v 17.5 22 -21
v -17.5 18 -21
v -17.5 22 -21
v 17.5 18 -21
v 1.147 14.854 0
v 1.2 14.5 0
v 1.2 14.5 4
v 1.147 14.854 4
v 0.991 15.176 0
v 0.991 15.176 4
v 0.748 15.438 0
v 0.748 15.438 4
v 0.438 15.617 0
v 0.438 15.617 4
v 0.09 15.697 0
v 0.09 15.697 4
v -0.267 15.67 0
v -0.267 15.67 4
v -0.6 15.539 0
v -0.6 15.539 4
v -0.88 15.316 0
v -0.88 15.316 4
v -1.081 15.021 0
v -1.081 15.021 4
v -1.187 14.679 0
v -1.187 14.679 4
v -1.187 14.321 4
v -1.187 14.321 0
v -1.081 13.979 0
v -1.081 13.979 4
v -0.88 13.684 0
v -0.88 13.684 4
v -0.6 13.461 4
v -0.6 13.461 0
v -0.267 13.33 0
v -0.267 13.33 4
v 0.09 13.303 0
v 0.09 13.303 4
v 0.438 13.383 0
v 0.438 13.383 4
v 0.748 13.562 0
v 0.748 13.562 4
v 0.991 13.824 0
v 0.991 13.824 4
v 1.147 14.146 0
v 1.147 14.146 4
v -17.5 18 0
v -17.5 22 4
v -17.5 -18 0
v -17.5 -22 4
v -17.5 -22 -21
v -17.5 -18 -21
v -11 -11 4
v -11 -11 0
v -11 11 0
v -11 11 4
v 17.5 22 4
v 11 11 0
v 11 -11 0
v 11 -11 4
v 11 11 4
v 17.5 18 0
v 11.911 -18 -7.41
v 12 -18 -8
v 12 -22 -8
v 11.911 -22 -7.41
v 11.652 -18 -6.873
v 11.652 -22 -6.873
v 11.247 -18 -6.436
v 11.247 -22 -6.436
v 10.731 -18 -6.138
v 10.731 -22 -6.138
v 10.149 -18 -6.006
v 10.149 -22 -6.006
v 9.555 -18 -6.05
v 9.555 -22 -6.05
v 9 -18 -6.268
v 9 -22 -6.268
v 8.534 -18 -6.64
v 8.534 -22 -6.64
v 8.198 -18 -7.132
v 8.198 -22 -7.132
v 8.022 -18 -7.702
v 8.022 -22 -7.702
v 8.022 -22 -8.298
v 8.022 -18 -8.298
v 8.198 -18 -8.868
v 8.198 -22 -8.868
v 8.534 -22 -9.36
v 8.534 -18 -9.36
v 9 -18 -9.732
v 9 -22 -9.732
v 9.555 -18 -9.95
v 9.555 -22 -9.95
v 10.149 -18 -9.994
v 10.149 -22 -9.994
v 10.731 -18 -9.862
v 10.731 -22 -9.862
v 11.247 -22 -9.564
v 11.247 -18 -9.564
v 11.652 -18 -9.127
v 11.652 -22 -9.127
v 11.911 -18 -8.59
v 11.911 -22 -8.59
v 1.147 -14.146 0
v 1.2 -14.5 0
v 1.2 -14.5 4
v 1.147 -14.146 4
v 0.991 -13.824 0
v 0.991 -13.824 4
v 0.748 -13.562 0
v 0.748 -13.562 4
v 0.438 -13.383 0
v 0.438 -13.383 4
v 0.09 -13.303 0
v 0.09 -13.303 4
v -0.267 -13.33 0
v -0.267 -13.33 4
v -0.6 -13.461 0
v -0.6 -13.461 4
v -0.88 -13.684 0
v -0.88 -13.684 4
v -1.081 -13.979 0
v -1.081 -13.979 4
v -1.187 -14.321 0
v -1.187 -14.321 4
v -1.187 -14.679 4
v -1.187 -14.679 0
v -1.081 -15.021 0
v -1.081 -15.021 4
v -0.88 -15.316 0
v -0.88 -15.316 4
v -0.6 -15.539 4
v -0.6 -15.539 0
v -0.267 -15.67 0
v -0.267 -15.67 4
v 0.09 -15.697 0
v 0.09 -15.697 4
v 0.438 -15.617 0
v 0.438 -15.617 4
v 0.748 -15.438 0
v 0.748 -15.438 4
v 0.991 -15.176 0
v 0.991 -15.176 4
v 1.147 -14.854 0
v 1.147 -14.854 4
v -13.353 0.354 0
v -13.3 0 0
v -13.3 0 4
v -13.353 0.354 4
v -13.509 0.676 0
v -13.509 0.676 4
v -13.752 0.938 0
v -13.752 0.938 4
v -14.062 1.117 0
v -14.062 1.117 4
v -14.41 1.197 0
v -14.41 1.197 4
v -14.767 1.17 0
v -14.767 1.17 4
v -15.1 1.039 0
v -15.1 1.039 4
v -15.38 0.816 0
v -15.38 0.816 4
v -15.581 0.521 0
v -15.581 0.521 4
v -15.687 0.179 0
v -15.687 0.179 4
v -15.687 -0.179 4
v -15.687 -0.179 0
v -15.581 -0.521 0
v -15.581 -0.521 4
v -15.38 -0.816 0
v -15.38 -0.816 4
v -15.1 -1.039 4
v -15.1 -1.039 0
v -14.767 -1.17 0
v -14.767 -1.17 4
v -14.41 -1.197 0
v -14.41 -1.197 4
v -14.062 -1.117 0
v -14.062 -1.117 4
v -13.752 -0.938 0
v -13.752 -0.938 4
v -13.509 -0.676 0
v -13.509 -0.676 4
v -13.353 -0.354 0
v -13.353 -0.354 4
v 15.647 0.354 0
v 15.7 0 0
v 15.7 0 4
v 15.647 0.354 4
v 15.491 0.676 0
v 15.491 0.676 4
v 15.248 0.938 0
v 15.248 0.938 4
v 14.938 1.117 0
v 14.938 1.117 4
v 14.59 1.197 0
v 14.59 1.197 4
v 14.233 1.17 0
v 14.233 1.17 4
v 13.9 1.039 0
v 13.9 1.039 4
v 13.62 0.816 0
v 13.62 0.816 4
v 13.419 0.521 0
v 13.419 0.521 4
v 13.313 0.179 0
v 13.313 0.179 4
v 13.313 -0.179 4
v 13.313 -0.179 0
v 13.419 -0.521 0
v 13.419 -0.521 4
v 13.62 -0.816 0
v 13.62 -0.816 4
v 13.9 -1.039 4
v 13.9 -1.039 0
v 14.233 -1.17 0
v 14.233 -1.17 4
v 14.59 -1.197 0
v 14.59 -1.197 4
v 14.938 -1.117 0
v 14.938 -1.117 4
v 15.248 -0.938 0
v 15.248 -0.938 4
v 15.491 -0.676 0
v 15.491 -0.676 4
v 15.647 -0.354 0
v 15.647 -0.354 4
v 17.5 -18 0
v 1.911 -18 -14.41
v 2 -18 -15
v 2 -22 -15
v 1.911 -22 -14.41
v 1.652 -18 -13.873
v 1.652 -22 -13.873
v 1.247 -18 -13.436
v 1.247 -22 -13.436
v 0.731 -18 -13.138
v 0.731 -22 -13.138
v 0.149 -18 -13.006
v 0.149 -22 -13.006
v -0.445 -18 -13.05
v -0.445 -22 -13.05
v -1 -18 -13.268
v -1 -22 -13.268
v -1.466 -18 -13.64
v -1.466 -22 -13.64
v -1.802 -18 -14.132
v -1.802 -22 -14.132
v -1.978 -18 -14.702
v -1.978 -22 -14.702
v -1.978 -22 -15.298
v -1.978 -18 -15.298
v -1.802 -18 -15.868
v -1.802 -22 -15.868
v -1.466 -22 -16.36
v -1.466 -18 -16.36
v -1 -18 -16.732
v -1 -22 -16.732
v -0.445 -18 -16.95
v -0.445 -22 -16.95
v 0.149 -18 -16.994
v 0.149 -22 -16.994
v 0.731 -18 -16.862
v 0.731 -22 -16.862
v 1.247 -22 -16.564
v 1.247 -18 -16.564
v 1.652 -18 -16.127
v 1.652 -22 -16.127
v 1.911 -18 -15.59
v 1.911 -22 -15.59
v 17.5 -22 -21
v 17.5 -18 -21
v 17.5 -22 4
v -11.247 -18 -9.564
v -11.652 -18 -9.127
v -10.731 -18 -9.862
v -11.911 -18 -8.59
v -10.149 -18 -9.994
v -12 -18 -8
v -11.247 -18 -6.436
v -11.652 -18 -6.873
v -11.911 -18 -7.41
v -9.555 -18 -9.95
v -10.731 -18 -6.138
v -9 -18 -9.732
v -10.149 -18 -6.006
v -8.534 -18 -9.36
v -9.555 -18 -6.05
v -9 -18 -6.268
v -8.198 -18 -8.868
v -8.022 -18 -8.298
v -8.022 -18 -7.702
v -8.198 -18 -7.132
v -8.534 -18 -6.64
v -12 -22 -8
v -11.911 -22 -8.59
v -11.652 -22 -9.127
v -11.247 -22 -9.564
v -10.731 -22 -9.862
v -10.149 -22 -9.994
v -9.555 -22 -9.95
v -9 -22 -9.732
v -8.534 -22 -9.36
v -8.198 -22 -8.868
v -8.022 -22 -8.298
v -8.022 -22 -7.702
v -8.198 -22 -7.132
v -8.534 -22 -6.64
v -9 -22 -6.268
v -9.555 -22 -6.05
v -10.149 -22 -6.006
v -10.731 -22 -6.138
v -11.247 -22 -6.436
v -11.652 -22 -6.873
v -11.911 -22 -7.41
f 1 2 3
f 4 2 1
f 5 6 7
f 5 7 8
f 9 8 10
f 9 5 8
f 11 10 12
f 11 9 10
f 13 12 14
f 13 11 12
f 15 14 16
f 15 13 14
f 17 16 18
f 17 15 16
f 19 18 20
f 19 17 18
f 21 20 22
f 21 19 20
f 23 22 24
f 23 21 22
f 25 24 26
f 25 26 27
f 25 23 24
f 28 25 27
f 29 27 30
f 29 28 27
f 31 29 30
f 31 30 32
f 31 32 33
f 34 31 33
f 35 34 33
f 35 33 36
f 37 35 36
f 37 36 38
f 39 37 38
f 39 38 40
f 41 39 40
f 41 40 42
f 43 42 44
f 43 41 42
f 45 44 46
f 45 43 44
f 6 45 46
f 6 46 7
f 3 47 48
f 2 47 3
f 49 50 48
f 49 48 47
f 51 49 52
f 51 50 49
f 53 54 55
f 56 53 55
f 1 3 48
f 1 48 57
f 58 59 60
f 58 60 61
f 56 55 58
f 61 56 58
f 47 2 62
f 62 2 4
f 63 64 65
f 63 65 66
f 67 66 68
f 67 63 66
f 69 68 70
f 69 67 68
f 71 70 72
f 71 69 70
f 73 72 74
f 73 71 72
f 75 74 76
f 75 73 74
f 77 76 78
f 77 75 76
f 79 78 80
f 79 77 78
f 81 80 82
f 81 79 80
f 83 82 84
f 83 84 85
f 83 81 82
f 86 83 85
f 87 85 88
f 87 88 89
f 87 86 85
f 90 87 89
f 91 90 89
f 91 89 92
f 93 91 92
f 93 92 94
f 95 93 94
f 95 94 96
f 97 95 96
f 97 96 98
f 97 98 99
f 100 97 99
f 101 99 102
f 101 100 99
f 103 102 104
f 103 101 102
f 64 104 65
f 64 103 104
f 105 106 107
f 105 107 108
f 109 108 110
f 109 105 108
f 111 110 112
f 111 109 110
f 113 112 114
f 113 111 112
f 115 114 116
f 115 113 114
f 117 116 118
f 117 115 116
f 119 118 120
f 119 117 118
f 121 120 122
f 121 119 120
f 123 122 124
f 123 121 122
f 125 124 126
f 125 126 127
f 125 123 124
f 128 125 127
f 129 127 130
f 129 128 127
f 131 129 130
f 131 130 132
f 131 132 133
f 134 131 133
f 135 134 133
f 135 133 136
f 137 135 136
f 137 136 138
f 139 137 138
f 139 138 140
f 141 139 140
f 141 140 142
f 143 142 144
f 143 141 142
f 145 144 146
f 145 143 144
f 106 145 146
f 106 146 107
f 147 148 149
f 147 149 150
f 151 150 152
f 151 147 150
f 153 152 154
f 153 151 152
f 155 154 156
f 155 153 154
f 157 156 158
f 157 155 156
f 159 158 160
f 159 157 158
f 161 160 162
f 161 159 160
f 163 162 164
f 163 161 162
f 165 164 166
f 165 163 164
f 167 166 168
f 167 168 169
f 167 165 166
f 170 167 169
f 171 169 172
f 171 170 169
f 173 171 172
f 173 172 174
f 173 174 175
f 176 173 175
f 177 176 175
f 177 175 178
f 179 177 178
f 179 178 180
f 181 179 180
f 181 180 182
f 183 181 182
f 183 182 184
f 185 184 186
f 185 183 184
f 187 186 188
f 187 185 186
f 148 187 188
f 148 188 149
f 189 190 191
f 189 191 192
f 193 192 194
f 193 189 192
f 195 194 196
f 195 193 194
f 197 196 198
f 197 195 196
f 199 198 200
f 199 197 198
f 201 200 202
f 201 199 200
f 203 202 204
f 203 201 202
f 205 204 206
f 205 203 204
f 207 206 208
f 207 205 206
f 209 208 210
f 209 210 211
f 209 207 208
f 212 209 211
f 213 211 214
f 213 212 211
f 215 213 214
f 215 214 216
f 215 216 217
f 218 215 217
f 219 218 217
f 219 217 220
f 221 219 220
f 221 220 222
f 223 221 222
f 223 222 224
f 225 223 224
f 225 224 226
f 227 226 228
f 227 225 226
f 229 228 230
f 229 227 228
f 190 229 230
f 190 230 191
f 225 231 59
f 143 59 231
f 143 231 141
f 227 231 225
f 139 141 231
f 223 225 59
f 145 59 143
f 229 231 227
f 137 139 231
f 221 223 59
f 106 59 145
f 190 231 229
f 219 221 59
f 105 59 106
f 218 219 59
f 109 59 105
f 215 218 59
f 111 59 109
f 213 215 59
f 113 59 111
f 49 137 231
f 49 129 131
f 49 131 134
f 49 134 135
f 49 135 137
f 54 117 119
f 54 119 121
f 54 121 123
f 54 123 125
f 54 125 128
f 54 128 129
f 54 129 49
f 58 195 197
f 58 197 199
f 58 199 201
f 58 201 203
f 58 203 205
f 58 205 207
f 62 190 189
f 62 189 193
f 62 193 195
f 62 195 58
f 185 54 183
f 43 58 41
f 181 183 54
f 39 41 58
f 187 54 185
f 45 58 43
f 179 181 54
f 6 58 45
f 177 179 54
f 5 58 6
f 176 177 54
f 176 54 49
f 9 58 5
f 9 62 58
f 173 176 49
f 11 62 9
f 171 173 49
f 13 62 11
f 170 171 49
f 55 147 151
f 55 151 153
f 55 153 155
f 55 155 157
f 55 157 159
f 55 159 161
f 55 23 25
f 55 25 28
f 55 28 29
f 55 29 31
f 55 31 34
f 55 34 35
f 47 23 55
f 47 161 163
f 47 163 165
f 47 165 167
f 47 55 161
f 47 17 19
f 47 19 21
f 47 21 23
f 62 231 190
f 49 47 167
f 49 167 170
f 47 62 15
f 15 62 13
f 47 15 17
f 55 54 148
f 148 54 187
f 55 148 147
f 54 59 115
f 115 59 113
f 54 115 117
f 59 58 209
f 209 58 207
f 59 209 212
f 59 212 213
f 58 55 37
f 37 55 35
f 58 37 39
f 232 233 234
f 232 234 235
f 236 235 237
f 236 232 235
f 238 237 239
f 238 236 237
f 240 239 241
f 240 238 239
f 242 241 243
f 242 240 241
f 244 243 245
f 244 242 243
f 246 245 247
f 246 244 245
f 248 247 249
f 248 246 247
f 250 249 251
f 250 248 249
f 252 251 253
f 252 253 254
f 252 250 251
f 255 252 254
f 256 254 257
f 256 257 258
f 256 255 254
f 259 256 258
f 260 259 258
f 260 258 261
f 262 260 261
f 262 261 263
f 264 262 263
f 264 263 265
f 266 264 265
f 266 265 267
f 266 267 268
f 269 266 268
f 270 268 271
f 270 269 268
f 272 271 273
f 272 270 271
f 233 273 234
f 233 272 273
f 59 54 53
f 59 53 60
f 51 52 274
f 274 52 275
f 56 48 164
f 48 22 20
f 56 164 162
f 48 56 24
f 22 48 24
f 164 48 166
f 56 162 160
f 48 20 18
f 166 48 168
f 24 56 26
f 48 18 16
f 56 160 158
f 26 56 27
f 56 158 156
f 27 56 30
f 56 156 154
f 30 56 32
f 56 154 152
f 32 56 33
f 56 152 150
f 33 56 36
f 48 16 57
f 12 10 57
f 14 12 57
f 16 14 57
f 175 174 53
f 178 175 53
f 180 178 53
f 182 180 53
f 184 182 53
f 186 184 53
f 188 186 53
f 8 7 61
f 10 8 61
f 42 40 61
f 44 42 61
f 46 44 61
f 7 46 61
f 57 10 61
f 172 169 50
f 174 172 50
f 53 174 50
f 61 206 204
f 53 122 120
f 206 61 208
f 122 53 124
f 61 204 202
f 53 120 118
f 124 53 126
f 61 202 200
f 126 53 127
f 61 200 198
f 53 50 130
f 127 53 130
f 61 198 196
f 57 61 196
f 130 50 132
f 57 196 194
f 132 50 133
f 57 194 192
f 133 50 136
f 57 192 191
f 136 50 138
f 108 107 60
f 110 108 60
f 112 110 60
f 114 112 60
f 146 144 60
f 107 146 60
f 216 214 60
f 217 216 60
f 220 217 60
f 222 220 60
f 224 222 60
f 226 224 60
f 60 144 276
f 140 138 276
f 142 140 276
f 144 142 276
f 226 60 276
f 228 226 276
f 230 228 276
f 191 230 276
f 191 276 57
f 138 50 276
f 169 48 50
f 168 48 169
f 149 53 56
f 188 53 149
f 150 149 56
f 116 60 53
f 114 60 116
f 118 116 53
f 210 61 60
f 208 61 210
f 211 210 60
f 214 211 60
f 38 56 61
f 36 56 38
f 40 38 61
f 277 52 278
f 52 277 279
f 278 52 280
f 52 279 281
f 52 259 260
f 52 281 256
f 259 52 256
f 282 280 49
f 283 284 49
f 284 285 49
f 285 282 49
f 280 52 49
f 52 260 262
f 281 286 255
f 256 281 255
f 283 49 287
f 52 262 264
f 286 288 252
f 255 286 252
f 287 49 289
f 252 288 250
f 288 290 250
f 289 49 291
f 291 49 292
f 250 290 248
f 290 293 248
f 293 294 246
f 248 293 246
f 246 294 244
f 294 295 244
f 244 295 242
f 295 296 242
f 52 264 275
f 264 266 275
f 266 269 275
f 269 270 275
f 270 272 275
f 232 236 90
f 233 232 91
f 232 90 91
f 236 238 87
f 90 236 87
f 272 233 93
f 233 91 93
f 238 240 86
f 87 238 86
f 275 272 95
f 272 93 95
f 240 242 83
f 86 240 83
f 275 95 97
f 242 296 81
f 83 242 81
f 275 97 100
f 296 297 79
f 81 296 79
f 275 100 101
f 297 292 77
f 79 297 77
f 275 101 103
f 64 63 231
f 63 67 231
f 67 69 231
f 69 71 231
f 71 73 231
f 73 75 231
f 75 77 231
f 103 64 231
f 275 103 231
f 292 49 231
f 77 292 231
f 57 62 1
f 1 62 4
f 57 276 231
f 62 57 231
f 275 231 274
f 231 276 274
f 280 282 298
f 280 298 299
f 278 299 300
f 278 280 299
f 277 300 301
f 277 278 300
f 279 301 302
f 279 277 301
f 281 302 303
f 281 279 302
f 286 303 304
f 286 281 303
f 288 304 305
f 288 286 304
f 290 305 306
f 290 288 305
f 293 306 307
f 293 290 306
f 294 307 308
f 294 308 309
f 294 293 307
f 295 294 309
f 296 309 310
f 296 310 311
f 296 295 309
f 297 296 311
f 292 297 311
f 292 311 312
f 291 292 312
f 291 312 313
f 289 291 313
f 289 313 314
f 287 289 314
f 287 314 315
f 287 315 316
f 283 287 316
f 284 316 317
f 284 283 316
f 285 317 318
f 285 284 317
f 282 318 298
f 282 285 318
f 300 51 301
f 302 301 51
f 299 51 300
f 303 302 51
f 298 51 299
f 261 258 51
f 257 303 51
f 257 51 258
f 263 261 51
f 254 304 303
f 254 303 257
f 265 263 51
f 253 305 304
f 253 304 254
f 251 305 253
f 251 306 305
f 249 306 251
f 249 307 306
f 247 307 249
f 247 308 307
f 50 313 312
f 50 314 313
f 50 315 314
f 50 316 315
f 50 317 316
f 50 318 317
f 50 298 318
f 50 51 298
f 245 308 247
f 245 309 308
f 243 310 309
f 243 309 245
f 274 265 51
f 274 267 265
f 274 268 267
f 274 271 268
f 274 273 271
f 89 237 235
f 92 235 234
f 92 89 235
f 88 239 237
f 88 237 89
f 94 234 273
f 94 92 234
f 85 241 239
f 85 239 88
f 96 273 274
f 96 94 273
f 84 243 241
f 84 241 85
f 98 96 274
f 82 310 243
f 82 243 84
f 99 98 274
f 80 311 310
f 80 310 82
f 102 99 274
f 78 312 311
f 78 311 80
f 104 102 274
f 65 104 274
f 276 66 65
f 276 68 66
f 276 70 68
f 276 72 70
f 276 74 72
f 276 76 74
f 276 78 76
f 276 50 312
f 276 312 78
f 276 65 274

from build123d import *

# Parameters (mm, degrees)
SKETCH_1_R      = 1.2
SKETCH_1_W      = 22
SKETCH_1_H      = 22
EXTRUDE_1_DEPTH = 4
SKETCH_2_W      = 35
SKETCH_2_H      = 25
SKETCH_2_R      = 2
EXTRUDE_2_DEPTH = 4
SKETCH_3_W      = 35
SKETCH_3_H      = 25
EXTRUDE_3_DEPTH = 4


with BuildPart() as part:
    # 草图1 → 凸台-拉伸1 (new body)
    with BuildSketch(Plane.XY):
        Polygon((17.5, 0), (17.5, -18), (-17.5, -18), (-17.5, 0), (-17.5, 18), (17.5, 18), align=None)
        with Locations((0, 14.5)):
            Circle(SKETCH_1_R, mode=Mode.SUBTRACT)
        with Locations((14.5, 0)):
            Circle(SKETCH_1_R, mode=Mode.SUBTRACT)
        with Locations((0, -14.5)):
            Circle(SKETCH_1_R, mode=Mode.SUBTRACT)
        with Locations((-14.5, 0)):
            Circle(SKETCH_1_R, mode=Mode.SUBTRACT)
        Rectangle(SKETCH_1_W, SKETCH_1_H, mode=Mode.SUBTRACT)
    extrude(amount=EXTRUDE_1_DEPTH)

    # 草图2 → 凸台-拉伸2 (add)
    with BuildSketch(Plane.XZ.offset(18)):
        with Locations((0, -8.5)):
            Rectangle(SKETCH_2_W, SKETCH_2_H)
        with Locations((10, -8)):
            Circle(SKETCH_2_R, mode=Mode.SUBTRACT)
        with Locations((0, -15)):
            Circle(SKETCH_2_R, mode=Mode.SUBTRACT)
        with Locations(Location((-10, -8, 0), (0, 0, 180))):
            Circle(SKETCH_2_R, mode=Mode.SUBTRACT)
    extrude(amount=EXTRUDE_2_DEPTH)

    # 草图3 → 凸台-拉伸3 (add)
    with BuildSketch(Plane(origin=(0, 18, 0), x_dir=(1, 0, 0), z_dir=(0, 1, 0))):
        with Locations((0, 8.5)):
            Rectangle(SKETCH_3_W, SKETCH_3_H)
    extrude(amount=EXTRUDE_3_DEPTH)


solid = part.part
